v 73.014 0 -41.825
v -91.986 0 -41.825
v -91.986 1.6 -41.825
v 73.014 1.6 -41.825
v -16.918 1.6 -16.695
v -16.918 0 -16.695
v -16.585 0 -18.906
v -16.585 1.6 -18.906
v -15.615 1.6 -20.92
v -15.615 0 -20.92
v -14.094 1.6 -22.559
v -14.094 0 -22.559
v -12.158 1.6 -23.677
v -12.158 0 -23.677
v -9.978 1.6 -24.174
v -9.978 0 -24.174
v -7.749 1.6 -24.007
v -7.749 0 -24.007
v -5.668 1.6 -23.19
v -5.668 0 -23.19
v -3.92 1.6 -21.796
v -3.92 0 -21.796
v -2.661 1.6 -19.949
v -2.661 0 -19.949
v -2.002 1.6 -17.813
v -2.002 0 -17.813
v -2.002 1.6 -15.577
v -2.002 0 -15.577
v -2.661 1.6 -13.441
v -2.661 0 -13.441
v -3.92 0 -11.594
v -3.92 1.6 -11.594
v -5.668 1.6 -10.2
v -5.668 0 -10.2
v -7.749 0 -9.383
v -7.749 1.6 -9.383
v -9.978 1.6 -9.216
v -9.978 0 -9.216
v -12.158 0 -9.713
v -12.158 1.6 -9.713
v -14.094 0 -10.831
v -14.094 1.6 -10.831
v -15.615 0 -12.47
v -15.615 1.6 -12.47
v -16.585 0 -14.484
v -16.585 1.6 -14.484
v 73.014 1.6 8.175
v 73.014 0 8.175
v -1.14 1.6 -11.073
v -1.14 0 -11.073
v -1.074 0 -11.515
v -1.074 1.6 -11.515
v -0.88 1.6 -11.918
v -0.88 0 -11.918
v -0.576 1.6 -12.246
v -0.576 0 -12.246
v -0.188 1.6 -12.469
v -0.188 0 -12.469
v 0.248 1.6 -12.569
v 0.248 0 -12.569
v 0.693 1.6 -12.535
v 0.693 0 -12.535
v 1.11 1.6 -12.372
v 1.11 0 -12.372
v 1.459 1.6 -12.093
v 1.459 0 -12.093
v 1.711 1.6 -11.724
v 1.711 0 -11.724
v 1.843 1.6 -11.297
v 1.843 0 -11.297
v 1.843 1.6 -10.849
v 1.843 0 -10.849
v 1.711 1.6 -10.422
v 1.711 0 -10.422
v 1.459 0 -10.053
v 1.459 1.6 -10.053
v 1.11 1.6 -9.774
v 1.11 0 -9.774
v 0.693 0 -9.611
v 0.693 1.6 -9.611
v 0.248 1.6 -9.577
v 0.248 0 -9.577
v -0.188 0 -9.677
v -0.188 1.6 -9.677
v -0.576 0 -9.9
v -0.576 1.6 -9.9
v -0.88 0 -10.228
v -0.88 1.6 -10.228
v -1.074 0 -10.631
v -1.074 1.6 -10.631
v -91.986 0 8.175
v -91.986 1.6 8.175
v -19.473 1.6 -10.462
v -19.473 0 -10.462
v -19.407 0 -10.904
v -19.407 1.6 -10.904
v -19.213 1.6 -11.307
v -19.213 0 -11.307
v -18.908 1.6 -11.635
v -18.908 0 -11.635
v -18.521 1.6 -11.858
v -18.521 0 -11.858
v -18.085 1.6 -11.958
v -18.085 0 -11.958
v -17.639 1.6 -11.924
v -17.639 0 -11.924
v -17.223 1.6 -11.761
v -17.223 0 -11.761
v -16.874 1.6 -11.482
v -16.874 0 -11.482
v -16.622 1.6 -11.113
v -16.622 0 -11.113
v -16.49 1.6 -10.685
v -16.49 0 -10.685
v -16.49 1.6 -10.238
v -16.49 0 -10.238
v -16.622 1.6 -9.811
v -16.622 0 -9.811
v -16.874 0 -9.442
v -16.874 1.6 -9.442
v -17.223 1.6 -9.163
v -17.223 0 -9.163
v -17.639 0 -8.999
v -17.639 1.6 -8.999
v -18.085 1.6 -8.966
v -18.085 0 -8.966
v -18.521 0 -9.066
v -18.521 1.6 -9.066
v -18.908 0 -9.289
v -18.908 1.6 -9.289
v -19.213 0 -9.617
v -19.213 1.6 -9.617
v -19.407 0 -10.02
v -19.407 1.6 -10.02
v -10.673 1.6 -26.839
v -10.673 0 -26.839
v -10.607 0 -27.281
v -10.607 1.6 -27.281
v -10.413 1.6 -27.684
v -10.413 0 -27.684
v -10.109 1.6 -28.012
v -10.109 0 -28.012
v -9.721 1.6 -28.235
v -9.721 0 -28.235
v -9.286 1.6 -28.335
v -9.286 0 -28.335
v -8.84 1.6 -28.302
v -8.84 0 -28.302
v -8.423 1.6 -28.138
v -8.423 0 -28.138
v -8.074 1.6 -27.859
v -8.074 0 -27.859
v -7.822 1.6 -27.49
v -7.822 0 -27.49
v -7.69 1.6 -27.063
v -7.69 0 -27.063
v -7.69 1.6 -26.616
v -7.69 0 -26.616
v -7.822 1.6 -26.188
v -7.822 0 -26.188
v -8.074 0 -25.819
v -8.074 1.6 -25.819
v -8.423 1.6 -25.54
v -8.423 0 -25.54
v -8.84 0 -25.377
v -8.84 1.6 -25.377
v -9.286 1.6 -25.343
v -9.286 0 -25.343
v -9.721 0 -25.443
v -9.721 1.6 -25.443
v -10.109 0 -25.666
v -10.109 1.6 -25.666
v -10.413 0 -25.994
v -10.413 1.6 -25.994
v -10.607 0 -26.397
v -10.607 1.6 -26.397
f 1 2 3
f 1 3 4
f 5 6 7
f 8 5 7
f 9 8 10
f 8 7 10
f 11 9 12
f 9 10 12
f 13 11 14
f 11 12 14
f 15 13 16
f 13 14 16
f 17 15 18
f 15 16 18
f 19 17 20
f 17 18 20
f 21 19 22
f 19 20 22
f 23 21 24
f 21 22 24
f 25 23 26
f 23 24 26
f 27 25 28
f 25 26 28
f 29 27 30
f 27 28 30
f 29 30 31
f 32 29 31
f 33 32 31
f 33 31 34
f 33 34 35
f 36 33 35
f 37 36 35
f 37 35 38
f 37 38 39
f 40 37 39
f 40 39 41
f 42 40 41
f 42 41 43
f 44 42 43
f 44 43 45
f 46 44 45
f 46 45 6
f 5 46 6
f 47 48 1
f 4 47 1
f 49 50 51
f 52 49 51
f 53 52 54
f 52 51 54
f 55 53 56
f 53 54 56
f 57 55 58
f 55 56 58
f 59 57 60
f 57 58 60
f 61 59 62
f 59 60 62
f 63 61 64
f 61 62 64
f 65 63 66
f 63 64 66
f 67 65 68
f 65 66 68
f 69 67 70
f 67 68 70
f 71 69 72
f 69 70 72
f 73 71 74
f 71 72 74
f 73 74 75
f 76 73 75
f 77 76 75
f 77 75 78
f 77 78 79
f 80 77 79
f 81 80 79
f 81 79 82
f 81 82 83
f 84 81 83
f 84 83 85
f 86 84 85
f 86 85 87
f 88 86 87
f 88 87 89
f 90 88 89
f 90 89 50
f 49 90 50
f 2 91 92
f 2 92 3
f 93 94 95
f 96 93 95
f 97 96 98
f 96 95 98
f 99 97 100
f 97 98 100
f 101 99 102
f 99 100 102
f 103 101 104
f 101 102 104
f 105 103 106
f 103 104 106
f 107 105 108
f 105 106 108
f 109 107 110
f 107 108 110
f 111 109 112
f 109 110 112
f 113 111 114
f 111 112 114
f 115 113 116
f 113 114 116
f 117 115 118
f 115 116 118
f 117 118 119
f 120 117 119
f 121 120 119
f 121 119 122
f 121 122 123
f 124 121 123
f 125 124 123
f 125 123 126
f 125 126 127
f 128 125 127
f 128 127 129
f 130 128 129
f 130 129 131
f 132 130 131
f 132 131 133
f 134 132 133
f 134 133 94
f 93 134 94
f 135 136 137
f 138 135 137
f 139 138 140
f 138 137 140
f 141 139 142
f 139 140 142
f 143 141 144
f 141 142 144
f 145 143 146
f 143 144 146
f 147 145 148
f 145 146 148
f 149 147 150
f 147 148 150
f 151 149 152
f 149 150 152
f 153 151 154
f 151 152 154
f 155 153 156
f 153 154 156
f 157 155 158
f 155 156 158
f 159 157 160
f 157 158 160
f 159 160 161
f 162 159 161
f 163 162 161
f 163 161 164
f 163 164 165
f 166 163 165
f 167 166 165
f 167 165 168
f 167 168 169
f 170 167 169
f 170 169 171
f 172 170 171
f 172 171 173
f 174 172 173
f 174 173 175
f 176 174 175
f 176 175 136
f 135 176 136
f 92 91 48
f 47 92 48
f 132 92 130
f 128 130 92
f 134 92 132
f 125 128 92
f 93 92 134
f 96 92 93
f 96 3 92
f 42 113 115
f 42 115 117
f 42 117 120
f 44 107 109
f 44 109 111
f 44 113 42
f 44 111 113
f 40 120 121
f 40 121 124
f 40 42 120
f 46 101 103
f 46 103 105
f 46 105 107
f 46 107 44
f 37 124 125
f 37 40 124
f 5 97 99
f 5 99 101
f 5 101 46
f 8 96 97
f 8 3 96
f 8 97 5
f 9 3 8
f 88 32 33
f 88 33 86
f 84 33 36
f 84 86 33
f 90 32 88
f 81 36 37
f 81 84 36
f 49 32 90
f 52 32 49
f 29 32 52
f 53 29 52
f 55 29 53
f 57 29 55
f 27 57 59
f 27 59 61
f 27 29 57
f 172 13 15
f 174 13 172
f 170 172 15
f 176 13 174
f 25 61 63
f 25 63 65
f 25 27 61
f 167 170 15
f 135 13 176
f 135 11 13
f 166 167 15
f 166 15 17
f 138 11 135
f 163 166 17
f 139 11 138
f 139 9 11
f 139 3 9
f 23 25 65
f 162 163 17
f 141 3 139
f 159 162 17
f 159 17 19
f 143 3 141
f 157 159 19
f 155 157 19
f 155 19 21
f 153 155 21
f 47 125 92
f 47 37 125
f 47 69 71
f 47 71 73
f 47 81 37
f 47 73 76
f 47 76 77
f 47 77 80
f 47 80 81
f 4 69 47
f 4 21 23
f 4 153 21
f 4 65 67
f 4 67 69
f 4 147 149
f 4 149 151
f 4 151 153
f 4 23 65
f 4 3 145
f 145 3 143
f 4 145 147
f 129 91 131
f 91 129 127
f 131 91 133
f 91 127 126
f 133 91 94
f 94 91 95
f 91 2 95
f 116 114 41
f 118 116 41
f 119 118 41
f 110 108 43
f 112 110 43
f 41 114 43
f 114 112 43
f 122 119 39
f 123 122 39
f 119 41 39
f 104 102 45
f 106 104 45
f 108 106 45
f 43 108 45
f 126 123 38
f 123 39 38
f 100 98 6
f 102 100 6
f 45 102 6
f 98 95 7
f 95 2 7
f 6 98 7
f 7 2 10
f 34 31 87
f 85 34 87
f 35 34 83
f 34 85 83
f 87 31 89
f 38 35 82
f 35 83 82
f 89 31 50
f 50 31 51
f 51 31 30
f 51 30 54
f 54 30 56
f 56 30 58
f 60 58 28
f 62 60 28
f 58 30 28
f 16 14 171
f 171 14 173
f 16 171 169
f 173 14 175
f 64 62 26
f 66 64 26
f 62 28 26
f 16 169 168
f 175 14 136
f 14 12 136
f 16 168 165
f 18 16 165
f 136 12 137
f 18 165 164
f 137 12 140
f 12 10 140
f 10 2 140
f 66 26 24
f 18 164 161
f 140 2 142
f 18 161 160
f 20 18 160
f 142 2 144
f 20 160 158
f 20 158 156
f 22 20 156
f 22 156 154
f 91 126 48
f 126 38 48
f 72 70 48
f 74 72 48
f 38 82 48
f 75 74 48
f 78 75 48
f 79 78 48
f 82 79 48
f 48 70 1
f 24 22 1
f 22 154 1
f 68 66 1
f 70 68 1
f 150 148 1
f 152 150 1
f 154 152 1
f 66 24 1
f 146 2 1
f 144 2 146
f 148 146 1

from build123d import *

# Parameters (mm, degrees)
SKETCH1_W             = 165
SKETCH1_H             = 50
BOSS_EXTRUDE1_DEPTH   = 1.6
F_5_0MM_DOWEL_HOLE1_D = 15
F_3_0MM_DOWEL_HOLE1_D = 3
F_3_0MM_DOWEL_HOLE2_D = 3
F_3_0MM_DOWEL_HOLE3_D = 3


with BuildPart() as part:
    # Sketch1 → Boss-Extrude1 (new body)
    with BuildSketch(Plane(origin=(0, 0, 0), x_dir=(1, 0, 0), z_dir=(0, 1, 0))):
        with Locations((-9.486062718, 16.824912892)):
            Rectangle(SKETCH1_W, SKETCH1_H)
    extrude(amount=BOSS_EXTRUDE1_DEPTH)

    # Ø5.0mm Dowel Hole1 (through all)
    with Locations(Plane(origin=(0, 1.6, 0), x_dir=(1, 0, 0), z_dir=(0, 1, 0))):
        with Locations((-9.417861972, 16.694999661)):
            Hole(F_5_0MM_DOWEL_HOLE1_D / 2)

    # Ø3.0mm Dowel Hole1 (through all)
    with Locations(Plane(origin=(0, 1.6, 0), x_dir=(1, 0, 0), z_dir=(0, 1, 0))):
        with Locations((-9.173425023, 26.839133027)):
            Hole(F_3_0MM_DOWEL_HOLE1_D / 2)

    # Ø3.0mm Dowel Hole2 (through all)
    with Locations(Plane(origin=(0, 1.6, 0), x_dir=(1, 0, 0), z_dir=(0, 1, 0))):
        with Locations((0.359615971, 11.072949843)):
            Hole(F_3_0MM_DOWEL_HOLE2_D / 2)

    # Ø3.0mm Dowel Hole3 (through all)
    with Locations(Plane(origin=(0, 1.6, 0), x_dir=(1, 0, 0), z_dir=(0, 1, 0))):
        with Locations((-17.973155173, 10.461857472)):
            Hole(F_3_0MM_DOWEL_HOLE3_D / 2)


solid = part.part
